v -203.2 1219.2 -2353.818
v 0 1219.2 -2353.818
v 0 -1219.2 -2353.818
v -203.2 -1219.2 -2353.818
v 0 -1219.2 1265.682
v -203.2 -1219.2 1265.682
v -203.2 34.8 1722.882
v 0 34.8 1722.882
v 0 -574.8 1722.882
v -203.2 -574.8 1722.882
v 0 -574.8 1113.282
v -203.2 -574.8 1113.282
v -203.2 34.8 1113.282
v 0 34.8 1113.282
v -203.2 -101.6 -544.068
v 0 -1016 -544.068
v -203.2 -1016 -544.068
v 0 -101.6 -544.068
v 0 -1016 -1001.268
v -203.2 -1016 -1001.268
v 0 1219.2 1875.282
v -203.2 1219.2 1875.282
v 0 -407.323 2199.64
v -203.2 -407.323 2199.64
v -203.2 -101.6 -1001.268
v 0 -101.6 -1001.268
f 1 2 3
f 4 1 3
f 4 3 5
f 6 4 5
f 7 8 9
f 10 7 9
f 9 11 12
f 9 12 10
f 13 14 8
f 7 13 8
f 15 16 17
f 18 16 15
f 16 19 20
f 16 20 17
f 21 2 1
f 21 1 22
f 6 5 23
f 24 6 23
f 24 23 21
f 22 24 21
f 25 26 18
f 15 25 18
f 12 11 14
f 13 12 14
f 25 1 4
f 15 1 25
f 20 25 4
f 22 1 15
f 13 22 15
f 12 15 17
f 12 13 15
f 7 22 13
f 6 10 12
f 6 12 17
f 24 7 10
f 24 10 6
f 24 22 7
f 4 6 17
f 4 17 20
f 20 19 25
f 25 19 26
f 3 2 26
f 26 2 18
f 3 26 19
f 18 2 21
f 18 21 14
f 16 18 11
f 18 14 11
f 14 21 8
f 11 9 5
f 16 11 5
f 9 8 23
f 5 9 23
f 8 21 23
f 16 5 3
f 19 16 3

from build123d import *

# Parameters (mm, degrees)
F0_W     = 2438.4
F0_H     = 4707.636
F1_DEPTH = 203.2
F3_ANGLE = 180
F5_DEPTH = 203.2
F6_W     = 914.4
F6_H     = 457.2
F7_DEPTH = 203.2
F8_W     = 304.8
F8_H     = 609.6
F9_DEPTH = 203.2


with BuildPart() as f1:
    # F0 (on Right) → F1 (new body)
    with BuildSketch(Plane.YZ):
        Rectangle(F0_W, F0_H)
    extrude(amount=F1_DEPTH)


with BuildPart() as f1_1:
    # F3: moved
    add(f1.part.rotate(Axis((0, 0, -18.999701), (0, 0, -1)), F3_ANGLE))

    # F4 (on face) → F5 (cut)
    with BuildSketch(Plane.YZ):
        Polygon((-1219.2, 1265.682), (-407.322697, 2199.64), (1219.2, 1875.282), (1219.2, 2353.818), (-1219.2, 2353.818), align=None)
    extrude(amount=-F5_DEPTH, mode=Mode.SUBTRACT)

    # F6 (on face) → F7 (cut)
    with BuildSketch(Plane.YZ):
        with Locations((-558.8, -772.668)):
            Rectangle(F6_W, F6_H)
    extrude(amount=-F7_DEPTH, mode=Mode.SUBTRACT)

    # F8 (on face) → F9 (cut)
    with BuildSketch(Plane.YZ):
        with Locations((-422.400398, 1418.082)):
            Rectangle(F8_W, F8_H)
        with Locations((-117.600398, 1418.082)):
            Rectangle(F8_W, F8_H)
    extrude(amount=-F9_DEPTH, mode=Mode.SUBTRACT)


solid = f1_1.part
